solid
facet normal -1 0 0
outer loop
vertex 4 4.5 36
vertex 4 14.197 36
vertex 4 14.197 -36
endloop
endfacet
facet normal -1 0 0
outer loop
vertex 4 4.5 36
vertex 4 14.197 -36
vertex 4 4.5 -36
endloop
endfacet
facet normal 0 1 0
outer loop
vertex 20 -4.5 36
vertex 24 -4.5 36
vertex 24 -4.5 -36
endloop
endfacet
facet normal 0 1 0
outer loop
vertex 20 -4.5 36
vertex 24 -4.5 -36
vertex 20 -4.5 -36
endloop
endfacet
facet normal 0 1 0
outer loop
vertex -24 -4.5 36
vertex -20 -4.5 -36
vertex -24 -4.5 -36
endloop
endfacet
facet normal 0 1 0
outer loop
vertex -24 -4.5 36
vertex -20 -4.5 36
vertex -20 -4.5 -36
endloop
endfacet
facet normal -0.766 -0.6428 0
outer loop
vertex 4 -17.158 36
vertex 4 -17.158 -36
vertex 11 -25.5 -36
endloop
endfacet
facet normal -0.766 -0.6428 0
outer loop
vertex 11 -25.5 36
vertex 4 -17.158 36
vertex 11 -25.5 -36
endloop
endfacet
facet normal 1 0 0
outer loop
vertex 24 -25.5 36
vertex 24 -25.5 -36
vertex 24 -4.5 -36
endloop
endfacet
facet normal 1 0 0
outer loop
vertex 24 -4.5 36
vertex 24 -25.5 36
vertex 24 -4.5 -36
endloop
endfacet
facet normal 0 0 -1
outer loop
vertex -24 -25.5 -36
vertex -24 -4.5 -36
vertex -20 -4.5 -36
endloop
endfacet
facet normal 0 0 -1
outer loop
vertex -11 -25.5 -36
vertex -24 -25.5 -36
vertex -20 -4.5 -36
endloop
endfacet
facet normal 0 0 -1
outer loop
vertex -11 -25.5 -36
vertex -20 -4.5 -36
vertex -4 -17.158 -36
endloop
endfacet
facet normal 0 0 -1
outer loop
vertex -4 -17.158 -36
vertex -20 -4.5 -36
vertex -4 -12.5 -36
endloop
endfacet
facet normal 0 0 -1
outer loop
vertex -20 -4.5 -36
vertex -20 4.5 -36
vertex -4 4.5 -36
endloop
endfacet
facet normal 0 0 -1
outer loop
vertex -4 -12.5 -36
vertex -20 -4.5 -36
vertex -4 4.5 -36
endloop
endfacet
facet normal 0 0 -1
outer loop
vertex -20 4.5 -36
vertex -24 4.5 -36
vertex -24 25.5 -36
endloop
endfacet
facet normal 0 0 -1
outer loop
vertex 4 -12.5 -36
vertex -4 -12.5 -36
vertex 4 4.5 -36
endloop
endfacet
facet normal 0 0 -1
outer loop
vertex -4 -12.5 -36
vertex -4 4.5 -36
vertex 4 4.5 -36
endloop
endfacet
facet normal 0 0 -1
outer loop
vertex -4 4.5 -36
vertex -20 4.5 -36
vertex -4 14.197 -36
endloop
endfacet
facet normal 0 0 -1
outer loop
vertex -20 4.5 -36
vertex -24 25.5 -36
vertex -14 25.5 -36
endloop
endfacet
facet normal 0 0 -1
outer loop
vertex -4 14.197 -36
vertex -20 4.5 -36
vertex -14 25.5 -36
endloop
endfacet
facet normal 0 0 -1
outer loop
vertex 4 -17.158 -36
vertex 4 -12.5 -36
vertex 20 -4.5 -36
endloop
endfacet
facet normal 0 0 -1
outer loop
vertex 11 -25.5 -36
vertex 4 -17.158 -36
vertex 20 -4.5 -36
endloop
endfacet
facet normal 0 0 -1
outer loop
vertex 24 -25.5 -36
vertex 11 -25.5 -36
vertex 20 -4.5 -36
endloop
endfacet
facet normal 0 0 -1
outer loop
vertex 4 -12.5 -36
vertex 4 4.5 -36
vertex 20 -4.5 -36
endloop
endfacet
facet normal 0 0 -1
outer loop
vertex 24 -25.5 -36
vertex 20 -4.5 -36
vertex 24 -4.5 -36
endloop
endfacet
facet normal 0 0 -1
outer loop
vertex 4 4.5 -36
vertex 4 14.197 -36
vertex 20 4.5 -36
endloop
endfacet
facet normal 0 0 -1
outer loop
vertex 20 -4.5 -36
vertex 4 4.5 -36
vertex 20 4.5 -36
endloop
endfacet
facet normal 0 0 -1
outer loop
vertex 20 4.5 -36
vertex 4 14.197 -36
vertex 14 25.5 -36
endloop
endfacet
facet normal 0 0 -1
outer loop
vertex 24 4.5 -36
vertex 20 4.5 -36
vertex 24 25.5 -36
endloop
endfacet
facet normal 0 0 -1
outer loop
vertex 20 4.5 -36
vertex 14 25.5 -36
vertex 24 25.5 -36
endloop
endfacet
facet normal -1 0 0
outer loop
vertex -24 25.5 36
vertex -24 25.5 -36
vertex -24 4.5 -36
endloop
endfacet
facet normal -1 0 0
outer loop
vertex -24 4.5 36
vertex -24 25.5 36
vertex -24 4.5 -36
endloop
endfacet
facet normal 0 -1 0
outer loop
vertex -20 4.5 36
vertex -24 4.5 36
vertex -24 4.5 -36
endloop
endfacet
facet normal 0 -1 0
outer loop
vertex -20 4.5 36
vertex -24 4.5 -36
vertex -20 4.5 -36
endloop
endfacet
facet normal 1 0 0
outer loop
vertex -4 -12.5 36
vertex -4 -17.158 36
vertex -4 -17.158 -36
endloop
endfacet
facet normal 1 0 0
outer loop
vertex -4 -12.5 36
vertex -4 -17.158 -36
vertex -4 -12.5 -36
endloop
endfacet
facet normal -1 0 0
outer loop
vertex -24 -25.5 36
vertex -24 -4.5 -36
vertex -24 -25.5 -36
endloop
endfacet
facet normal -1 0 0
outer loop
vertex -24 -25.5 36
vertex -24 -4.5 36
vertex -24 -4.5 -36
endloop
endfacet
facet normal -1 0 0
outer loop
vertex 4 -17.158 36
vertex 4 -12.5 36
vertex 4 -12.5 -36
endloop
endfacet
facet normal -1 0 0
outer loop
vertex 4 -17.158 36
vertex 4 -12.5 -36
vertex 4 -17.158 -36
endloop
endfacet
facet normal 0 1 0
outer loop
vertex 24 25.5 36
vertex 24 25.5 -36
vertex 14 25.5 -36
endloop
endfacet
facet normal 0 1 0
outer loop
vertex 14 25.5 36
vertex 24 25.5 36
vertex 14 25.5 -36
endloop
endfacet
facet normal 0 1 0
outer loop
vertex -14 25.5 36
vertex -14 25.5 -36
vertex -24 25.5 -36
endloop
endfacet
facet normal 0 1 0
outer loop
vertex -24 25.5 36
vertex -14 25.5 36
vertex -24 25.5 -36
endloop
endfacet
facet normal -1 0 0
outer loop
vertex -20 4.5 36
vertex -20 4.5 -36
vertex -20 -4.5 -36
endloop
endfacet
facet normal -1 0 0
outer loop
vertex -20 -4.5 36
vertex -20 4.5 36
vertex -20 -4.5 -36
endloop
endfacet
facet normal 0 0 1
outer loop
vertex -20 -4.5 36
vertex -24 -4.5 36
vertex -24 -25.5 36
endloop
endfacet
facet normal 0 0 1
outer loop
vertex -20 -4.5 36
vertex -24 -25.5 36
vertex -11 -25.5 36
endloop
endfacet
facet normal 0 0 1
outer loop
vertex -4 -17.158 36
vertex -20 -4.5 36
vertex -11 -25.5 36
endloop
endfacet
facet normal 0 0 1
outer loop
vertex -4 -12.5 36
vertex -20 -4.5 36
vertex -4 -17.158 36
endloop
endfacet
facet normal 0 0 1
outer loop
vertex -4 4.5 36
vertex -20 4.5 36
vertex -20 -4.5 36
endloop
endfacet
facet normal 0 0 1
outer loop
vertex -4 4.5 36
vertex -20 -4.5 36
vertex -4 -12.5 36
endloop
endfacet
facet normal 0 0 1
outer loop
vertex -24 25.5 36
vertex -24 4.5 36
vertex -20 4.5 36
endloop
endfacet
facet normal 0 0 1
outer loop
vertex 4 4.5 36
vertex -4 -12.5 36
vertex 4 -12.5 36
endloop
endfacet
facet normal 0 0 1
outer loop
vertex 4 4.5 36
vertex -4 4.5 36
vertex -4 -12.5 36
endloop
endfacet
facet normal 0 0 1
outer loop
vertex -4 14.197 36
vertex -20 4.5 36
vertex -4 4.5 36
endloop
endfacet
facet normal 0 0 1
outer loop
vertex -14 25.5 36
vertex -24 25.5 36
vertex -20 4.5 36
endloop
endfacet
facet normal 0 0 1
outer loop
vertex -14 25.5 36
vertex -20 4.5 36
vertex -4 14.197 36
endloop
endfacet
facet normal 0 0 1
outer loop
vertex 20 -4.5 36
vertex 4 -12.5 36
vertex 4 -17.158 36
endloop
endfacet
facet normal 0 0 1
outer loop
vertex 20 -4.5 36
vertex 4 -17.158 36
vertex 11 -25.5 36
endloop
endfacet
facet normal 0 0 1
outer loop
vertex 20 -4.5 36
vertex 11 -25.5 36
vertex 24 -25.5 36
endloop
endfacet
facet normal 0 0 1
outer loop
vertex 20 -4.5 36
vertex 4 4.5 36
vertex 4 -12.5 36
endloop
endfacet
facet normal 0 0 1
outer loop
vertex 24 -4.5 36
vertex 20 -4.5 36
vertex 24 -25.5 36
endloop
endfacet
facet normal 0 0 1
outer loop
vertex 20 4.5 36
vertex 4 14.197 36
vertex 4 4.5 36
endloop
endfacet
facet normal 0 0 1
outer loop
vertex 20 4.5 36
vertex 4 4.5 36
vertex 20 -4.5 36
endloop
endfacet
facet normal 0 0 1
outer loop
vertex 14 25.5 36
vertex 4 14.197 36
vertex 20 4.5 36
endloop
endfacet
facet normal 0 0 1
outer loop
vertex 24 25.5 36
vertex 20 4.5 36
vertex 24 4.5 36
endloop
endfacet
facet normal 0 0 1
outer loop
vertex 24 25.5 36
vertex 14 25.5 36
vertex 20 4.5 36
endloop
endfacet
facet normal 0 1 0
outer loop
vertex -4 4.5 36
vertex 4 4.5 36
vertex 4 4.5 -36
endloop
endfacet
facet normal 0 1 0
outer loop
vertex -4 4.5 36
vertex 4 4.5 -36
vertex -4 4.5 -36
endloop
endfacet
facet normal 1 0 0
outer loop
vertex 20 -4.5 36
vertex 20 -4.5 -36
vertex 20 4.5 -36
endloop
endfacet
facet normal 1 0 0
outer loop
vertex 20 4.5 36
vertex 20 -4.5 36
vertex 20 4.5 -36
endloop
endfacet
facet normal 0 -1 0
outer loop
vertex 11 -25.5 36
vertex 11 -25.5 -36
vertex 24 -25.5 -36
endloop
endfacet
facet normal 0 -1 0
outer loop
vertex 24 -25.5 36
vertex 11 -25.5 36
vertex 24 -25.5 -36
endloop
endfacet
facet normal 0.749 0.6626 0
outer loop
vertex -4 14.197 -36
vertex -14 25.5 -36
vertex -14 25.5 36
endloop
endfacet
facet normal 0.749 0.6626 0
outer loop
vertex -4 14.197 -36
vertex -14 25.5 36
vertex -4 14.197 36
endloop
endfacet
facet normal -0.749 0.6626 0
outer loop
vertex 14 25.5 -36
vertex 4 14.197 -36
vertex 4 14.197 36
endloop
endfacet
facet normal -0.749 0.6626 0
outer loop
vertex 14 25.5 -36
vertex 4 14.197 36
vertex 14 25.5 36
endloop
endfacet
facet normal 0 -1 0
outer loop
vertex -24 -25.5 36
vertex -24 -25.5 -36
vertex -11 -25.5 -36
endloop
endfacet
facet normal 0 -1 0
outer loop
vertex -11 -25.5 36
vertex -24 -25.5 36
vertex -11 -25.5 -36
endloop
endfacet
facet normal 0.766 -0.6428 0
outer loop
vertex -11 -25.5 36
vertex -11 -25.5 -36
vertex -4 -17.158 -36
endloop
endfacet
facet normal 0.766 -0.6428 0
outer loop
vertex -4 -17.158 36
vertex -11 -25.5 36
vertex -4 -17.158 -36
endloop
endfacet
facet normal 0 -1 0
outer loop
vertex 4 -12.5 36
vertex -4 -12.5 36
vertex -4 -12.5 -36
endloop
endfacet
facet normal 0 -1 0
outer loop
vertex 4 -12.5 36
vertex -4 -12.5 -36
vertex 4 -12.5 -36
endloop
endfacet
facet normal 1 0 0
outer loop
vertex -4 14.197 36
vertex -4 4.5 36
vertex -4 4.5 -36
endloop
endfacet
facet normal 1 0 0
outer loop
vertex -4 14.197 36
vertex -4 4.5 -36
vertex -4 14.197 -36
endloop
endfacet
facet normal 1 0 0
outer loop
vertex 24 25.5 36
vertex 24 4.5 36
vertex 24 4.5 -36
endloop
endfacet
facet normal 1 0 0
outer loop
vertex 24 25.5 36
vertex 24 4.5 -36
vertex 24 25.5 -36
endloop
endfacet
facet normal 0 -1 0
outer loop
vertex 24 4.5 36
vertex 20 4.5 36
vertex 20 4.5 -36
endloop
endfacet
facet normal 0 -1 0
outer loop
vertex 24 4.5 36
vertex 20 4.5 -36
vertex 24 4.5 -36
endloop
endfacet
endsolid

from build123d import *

# Parameters (mm, degrees)
BOSS_EXTRUDE1_DEPTH     = 36
CUT_EXTRUDE1_DEPTH      = 51.222007128
CUT_EXTRUDE1_DEPTH_BACK = 51.222007128
CUT_EXTRUDE2_DEPTH      = 51.222007128
CUT_EXTRUDE2_DEPTH_BACK = 51.222007128


with BuildPart() as part:
    # Sketch1 → Boss-Extrude1 (new, symmetric)
    with BuildSketch(Plane.XY):
        Polygon((-24, -25.5), (-4, -25.5), (-4, -12.5), (4, -12.5), (4, -25.5), (24, -25.5), (24, -4.5), (20, -4.5), (20, 4.5), (24, 4.5), (24, 25.5), (4, 25.5), (4, 4.5), (-4, 4.5), (-4, 25.5), (-24, 25.5), (-24, 4.5), (-20, 4.5), (-20, -4.5), (-24, -4.5), align=None)
    extrude(amount=BOSS_EXTRUDE1_DEPTH, both=True)

    # Sketch2 → Cut-Extrude1 (cut, two sides: drawn at the far end of the back side and taken through both)
    with BuildSketch(Plane.XY.offset(-CUT_EXTRUDE1_DEPTH_BACK)):
        Polygon((-14, 25.5), (-4, 14.197056136), (4, 14.197056136), (14, 25.5), align=None)
    extrude(amount=CUT_EXTRUDE1_DEPTH + CUT_EXTRUDE1_DEPTH_BACK, mode=Mode.SUBTRACT)

    # Sketch3 → Cut-Extrude2 (cut, two sides: drawn at the far end of the back side and taken through both)
    with BuildSketch(Plane.XY.offset(-CUT_EXTRUDE2_DEPTH_BACK)):
        Polygon((4, -17.157724852), (11, -25.5), (-11, -25.5), (-4, -17.157724852), align=None)
    extrude(amount=CUT_EXTRUDE2_DEPTH + CUT_EXTRUDE2_DEPTH_BACK, mode=Mode.SUBTRACT)


solid = part.part
